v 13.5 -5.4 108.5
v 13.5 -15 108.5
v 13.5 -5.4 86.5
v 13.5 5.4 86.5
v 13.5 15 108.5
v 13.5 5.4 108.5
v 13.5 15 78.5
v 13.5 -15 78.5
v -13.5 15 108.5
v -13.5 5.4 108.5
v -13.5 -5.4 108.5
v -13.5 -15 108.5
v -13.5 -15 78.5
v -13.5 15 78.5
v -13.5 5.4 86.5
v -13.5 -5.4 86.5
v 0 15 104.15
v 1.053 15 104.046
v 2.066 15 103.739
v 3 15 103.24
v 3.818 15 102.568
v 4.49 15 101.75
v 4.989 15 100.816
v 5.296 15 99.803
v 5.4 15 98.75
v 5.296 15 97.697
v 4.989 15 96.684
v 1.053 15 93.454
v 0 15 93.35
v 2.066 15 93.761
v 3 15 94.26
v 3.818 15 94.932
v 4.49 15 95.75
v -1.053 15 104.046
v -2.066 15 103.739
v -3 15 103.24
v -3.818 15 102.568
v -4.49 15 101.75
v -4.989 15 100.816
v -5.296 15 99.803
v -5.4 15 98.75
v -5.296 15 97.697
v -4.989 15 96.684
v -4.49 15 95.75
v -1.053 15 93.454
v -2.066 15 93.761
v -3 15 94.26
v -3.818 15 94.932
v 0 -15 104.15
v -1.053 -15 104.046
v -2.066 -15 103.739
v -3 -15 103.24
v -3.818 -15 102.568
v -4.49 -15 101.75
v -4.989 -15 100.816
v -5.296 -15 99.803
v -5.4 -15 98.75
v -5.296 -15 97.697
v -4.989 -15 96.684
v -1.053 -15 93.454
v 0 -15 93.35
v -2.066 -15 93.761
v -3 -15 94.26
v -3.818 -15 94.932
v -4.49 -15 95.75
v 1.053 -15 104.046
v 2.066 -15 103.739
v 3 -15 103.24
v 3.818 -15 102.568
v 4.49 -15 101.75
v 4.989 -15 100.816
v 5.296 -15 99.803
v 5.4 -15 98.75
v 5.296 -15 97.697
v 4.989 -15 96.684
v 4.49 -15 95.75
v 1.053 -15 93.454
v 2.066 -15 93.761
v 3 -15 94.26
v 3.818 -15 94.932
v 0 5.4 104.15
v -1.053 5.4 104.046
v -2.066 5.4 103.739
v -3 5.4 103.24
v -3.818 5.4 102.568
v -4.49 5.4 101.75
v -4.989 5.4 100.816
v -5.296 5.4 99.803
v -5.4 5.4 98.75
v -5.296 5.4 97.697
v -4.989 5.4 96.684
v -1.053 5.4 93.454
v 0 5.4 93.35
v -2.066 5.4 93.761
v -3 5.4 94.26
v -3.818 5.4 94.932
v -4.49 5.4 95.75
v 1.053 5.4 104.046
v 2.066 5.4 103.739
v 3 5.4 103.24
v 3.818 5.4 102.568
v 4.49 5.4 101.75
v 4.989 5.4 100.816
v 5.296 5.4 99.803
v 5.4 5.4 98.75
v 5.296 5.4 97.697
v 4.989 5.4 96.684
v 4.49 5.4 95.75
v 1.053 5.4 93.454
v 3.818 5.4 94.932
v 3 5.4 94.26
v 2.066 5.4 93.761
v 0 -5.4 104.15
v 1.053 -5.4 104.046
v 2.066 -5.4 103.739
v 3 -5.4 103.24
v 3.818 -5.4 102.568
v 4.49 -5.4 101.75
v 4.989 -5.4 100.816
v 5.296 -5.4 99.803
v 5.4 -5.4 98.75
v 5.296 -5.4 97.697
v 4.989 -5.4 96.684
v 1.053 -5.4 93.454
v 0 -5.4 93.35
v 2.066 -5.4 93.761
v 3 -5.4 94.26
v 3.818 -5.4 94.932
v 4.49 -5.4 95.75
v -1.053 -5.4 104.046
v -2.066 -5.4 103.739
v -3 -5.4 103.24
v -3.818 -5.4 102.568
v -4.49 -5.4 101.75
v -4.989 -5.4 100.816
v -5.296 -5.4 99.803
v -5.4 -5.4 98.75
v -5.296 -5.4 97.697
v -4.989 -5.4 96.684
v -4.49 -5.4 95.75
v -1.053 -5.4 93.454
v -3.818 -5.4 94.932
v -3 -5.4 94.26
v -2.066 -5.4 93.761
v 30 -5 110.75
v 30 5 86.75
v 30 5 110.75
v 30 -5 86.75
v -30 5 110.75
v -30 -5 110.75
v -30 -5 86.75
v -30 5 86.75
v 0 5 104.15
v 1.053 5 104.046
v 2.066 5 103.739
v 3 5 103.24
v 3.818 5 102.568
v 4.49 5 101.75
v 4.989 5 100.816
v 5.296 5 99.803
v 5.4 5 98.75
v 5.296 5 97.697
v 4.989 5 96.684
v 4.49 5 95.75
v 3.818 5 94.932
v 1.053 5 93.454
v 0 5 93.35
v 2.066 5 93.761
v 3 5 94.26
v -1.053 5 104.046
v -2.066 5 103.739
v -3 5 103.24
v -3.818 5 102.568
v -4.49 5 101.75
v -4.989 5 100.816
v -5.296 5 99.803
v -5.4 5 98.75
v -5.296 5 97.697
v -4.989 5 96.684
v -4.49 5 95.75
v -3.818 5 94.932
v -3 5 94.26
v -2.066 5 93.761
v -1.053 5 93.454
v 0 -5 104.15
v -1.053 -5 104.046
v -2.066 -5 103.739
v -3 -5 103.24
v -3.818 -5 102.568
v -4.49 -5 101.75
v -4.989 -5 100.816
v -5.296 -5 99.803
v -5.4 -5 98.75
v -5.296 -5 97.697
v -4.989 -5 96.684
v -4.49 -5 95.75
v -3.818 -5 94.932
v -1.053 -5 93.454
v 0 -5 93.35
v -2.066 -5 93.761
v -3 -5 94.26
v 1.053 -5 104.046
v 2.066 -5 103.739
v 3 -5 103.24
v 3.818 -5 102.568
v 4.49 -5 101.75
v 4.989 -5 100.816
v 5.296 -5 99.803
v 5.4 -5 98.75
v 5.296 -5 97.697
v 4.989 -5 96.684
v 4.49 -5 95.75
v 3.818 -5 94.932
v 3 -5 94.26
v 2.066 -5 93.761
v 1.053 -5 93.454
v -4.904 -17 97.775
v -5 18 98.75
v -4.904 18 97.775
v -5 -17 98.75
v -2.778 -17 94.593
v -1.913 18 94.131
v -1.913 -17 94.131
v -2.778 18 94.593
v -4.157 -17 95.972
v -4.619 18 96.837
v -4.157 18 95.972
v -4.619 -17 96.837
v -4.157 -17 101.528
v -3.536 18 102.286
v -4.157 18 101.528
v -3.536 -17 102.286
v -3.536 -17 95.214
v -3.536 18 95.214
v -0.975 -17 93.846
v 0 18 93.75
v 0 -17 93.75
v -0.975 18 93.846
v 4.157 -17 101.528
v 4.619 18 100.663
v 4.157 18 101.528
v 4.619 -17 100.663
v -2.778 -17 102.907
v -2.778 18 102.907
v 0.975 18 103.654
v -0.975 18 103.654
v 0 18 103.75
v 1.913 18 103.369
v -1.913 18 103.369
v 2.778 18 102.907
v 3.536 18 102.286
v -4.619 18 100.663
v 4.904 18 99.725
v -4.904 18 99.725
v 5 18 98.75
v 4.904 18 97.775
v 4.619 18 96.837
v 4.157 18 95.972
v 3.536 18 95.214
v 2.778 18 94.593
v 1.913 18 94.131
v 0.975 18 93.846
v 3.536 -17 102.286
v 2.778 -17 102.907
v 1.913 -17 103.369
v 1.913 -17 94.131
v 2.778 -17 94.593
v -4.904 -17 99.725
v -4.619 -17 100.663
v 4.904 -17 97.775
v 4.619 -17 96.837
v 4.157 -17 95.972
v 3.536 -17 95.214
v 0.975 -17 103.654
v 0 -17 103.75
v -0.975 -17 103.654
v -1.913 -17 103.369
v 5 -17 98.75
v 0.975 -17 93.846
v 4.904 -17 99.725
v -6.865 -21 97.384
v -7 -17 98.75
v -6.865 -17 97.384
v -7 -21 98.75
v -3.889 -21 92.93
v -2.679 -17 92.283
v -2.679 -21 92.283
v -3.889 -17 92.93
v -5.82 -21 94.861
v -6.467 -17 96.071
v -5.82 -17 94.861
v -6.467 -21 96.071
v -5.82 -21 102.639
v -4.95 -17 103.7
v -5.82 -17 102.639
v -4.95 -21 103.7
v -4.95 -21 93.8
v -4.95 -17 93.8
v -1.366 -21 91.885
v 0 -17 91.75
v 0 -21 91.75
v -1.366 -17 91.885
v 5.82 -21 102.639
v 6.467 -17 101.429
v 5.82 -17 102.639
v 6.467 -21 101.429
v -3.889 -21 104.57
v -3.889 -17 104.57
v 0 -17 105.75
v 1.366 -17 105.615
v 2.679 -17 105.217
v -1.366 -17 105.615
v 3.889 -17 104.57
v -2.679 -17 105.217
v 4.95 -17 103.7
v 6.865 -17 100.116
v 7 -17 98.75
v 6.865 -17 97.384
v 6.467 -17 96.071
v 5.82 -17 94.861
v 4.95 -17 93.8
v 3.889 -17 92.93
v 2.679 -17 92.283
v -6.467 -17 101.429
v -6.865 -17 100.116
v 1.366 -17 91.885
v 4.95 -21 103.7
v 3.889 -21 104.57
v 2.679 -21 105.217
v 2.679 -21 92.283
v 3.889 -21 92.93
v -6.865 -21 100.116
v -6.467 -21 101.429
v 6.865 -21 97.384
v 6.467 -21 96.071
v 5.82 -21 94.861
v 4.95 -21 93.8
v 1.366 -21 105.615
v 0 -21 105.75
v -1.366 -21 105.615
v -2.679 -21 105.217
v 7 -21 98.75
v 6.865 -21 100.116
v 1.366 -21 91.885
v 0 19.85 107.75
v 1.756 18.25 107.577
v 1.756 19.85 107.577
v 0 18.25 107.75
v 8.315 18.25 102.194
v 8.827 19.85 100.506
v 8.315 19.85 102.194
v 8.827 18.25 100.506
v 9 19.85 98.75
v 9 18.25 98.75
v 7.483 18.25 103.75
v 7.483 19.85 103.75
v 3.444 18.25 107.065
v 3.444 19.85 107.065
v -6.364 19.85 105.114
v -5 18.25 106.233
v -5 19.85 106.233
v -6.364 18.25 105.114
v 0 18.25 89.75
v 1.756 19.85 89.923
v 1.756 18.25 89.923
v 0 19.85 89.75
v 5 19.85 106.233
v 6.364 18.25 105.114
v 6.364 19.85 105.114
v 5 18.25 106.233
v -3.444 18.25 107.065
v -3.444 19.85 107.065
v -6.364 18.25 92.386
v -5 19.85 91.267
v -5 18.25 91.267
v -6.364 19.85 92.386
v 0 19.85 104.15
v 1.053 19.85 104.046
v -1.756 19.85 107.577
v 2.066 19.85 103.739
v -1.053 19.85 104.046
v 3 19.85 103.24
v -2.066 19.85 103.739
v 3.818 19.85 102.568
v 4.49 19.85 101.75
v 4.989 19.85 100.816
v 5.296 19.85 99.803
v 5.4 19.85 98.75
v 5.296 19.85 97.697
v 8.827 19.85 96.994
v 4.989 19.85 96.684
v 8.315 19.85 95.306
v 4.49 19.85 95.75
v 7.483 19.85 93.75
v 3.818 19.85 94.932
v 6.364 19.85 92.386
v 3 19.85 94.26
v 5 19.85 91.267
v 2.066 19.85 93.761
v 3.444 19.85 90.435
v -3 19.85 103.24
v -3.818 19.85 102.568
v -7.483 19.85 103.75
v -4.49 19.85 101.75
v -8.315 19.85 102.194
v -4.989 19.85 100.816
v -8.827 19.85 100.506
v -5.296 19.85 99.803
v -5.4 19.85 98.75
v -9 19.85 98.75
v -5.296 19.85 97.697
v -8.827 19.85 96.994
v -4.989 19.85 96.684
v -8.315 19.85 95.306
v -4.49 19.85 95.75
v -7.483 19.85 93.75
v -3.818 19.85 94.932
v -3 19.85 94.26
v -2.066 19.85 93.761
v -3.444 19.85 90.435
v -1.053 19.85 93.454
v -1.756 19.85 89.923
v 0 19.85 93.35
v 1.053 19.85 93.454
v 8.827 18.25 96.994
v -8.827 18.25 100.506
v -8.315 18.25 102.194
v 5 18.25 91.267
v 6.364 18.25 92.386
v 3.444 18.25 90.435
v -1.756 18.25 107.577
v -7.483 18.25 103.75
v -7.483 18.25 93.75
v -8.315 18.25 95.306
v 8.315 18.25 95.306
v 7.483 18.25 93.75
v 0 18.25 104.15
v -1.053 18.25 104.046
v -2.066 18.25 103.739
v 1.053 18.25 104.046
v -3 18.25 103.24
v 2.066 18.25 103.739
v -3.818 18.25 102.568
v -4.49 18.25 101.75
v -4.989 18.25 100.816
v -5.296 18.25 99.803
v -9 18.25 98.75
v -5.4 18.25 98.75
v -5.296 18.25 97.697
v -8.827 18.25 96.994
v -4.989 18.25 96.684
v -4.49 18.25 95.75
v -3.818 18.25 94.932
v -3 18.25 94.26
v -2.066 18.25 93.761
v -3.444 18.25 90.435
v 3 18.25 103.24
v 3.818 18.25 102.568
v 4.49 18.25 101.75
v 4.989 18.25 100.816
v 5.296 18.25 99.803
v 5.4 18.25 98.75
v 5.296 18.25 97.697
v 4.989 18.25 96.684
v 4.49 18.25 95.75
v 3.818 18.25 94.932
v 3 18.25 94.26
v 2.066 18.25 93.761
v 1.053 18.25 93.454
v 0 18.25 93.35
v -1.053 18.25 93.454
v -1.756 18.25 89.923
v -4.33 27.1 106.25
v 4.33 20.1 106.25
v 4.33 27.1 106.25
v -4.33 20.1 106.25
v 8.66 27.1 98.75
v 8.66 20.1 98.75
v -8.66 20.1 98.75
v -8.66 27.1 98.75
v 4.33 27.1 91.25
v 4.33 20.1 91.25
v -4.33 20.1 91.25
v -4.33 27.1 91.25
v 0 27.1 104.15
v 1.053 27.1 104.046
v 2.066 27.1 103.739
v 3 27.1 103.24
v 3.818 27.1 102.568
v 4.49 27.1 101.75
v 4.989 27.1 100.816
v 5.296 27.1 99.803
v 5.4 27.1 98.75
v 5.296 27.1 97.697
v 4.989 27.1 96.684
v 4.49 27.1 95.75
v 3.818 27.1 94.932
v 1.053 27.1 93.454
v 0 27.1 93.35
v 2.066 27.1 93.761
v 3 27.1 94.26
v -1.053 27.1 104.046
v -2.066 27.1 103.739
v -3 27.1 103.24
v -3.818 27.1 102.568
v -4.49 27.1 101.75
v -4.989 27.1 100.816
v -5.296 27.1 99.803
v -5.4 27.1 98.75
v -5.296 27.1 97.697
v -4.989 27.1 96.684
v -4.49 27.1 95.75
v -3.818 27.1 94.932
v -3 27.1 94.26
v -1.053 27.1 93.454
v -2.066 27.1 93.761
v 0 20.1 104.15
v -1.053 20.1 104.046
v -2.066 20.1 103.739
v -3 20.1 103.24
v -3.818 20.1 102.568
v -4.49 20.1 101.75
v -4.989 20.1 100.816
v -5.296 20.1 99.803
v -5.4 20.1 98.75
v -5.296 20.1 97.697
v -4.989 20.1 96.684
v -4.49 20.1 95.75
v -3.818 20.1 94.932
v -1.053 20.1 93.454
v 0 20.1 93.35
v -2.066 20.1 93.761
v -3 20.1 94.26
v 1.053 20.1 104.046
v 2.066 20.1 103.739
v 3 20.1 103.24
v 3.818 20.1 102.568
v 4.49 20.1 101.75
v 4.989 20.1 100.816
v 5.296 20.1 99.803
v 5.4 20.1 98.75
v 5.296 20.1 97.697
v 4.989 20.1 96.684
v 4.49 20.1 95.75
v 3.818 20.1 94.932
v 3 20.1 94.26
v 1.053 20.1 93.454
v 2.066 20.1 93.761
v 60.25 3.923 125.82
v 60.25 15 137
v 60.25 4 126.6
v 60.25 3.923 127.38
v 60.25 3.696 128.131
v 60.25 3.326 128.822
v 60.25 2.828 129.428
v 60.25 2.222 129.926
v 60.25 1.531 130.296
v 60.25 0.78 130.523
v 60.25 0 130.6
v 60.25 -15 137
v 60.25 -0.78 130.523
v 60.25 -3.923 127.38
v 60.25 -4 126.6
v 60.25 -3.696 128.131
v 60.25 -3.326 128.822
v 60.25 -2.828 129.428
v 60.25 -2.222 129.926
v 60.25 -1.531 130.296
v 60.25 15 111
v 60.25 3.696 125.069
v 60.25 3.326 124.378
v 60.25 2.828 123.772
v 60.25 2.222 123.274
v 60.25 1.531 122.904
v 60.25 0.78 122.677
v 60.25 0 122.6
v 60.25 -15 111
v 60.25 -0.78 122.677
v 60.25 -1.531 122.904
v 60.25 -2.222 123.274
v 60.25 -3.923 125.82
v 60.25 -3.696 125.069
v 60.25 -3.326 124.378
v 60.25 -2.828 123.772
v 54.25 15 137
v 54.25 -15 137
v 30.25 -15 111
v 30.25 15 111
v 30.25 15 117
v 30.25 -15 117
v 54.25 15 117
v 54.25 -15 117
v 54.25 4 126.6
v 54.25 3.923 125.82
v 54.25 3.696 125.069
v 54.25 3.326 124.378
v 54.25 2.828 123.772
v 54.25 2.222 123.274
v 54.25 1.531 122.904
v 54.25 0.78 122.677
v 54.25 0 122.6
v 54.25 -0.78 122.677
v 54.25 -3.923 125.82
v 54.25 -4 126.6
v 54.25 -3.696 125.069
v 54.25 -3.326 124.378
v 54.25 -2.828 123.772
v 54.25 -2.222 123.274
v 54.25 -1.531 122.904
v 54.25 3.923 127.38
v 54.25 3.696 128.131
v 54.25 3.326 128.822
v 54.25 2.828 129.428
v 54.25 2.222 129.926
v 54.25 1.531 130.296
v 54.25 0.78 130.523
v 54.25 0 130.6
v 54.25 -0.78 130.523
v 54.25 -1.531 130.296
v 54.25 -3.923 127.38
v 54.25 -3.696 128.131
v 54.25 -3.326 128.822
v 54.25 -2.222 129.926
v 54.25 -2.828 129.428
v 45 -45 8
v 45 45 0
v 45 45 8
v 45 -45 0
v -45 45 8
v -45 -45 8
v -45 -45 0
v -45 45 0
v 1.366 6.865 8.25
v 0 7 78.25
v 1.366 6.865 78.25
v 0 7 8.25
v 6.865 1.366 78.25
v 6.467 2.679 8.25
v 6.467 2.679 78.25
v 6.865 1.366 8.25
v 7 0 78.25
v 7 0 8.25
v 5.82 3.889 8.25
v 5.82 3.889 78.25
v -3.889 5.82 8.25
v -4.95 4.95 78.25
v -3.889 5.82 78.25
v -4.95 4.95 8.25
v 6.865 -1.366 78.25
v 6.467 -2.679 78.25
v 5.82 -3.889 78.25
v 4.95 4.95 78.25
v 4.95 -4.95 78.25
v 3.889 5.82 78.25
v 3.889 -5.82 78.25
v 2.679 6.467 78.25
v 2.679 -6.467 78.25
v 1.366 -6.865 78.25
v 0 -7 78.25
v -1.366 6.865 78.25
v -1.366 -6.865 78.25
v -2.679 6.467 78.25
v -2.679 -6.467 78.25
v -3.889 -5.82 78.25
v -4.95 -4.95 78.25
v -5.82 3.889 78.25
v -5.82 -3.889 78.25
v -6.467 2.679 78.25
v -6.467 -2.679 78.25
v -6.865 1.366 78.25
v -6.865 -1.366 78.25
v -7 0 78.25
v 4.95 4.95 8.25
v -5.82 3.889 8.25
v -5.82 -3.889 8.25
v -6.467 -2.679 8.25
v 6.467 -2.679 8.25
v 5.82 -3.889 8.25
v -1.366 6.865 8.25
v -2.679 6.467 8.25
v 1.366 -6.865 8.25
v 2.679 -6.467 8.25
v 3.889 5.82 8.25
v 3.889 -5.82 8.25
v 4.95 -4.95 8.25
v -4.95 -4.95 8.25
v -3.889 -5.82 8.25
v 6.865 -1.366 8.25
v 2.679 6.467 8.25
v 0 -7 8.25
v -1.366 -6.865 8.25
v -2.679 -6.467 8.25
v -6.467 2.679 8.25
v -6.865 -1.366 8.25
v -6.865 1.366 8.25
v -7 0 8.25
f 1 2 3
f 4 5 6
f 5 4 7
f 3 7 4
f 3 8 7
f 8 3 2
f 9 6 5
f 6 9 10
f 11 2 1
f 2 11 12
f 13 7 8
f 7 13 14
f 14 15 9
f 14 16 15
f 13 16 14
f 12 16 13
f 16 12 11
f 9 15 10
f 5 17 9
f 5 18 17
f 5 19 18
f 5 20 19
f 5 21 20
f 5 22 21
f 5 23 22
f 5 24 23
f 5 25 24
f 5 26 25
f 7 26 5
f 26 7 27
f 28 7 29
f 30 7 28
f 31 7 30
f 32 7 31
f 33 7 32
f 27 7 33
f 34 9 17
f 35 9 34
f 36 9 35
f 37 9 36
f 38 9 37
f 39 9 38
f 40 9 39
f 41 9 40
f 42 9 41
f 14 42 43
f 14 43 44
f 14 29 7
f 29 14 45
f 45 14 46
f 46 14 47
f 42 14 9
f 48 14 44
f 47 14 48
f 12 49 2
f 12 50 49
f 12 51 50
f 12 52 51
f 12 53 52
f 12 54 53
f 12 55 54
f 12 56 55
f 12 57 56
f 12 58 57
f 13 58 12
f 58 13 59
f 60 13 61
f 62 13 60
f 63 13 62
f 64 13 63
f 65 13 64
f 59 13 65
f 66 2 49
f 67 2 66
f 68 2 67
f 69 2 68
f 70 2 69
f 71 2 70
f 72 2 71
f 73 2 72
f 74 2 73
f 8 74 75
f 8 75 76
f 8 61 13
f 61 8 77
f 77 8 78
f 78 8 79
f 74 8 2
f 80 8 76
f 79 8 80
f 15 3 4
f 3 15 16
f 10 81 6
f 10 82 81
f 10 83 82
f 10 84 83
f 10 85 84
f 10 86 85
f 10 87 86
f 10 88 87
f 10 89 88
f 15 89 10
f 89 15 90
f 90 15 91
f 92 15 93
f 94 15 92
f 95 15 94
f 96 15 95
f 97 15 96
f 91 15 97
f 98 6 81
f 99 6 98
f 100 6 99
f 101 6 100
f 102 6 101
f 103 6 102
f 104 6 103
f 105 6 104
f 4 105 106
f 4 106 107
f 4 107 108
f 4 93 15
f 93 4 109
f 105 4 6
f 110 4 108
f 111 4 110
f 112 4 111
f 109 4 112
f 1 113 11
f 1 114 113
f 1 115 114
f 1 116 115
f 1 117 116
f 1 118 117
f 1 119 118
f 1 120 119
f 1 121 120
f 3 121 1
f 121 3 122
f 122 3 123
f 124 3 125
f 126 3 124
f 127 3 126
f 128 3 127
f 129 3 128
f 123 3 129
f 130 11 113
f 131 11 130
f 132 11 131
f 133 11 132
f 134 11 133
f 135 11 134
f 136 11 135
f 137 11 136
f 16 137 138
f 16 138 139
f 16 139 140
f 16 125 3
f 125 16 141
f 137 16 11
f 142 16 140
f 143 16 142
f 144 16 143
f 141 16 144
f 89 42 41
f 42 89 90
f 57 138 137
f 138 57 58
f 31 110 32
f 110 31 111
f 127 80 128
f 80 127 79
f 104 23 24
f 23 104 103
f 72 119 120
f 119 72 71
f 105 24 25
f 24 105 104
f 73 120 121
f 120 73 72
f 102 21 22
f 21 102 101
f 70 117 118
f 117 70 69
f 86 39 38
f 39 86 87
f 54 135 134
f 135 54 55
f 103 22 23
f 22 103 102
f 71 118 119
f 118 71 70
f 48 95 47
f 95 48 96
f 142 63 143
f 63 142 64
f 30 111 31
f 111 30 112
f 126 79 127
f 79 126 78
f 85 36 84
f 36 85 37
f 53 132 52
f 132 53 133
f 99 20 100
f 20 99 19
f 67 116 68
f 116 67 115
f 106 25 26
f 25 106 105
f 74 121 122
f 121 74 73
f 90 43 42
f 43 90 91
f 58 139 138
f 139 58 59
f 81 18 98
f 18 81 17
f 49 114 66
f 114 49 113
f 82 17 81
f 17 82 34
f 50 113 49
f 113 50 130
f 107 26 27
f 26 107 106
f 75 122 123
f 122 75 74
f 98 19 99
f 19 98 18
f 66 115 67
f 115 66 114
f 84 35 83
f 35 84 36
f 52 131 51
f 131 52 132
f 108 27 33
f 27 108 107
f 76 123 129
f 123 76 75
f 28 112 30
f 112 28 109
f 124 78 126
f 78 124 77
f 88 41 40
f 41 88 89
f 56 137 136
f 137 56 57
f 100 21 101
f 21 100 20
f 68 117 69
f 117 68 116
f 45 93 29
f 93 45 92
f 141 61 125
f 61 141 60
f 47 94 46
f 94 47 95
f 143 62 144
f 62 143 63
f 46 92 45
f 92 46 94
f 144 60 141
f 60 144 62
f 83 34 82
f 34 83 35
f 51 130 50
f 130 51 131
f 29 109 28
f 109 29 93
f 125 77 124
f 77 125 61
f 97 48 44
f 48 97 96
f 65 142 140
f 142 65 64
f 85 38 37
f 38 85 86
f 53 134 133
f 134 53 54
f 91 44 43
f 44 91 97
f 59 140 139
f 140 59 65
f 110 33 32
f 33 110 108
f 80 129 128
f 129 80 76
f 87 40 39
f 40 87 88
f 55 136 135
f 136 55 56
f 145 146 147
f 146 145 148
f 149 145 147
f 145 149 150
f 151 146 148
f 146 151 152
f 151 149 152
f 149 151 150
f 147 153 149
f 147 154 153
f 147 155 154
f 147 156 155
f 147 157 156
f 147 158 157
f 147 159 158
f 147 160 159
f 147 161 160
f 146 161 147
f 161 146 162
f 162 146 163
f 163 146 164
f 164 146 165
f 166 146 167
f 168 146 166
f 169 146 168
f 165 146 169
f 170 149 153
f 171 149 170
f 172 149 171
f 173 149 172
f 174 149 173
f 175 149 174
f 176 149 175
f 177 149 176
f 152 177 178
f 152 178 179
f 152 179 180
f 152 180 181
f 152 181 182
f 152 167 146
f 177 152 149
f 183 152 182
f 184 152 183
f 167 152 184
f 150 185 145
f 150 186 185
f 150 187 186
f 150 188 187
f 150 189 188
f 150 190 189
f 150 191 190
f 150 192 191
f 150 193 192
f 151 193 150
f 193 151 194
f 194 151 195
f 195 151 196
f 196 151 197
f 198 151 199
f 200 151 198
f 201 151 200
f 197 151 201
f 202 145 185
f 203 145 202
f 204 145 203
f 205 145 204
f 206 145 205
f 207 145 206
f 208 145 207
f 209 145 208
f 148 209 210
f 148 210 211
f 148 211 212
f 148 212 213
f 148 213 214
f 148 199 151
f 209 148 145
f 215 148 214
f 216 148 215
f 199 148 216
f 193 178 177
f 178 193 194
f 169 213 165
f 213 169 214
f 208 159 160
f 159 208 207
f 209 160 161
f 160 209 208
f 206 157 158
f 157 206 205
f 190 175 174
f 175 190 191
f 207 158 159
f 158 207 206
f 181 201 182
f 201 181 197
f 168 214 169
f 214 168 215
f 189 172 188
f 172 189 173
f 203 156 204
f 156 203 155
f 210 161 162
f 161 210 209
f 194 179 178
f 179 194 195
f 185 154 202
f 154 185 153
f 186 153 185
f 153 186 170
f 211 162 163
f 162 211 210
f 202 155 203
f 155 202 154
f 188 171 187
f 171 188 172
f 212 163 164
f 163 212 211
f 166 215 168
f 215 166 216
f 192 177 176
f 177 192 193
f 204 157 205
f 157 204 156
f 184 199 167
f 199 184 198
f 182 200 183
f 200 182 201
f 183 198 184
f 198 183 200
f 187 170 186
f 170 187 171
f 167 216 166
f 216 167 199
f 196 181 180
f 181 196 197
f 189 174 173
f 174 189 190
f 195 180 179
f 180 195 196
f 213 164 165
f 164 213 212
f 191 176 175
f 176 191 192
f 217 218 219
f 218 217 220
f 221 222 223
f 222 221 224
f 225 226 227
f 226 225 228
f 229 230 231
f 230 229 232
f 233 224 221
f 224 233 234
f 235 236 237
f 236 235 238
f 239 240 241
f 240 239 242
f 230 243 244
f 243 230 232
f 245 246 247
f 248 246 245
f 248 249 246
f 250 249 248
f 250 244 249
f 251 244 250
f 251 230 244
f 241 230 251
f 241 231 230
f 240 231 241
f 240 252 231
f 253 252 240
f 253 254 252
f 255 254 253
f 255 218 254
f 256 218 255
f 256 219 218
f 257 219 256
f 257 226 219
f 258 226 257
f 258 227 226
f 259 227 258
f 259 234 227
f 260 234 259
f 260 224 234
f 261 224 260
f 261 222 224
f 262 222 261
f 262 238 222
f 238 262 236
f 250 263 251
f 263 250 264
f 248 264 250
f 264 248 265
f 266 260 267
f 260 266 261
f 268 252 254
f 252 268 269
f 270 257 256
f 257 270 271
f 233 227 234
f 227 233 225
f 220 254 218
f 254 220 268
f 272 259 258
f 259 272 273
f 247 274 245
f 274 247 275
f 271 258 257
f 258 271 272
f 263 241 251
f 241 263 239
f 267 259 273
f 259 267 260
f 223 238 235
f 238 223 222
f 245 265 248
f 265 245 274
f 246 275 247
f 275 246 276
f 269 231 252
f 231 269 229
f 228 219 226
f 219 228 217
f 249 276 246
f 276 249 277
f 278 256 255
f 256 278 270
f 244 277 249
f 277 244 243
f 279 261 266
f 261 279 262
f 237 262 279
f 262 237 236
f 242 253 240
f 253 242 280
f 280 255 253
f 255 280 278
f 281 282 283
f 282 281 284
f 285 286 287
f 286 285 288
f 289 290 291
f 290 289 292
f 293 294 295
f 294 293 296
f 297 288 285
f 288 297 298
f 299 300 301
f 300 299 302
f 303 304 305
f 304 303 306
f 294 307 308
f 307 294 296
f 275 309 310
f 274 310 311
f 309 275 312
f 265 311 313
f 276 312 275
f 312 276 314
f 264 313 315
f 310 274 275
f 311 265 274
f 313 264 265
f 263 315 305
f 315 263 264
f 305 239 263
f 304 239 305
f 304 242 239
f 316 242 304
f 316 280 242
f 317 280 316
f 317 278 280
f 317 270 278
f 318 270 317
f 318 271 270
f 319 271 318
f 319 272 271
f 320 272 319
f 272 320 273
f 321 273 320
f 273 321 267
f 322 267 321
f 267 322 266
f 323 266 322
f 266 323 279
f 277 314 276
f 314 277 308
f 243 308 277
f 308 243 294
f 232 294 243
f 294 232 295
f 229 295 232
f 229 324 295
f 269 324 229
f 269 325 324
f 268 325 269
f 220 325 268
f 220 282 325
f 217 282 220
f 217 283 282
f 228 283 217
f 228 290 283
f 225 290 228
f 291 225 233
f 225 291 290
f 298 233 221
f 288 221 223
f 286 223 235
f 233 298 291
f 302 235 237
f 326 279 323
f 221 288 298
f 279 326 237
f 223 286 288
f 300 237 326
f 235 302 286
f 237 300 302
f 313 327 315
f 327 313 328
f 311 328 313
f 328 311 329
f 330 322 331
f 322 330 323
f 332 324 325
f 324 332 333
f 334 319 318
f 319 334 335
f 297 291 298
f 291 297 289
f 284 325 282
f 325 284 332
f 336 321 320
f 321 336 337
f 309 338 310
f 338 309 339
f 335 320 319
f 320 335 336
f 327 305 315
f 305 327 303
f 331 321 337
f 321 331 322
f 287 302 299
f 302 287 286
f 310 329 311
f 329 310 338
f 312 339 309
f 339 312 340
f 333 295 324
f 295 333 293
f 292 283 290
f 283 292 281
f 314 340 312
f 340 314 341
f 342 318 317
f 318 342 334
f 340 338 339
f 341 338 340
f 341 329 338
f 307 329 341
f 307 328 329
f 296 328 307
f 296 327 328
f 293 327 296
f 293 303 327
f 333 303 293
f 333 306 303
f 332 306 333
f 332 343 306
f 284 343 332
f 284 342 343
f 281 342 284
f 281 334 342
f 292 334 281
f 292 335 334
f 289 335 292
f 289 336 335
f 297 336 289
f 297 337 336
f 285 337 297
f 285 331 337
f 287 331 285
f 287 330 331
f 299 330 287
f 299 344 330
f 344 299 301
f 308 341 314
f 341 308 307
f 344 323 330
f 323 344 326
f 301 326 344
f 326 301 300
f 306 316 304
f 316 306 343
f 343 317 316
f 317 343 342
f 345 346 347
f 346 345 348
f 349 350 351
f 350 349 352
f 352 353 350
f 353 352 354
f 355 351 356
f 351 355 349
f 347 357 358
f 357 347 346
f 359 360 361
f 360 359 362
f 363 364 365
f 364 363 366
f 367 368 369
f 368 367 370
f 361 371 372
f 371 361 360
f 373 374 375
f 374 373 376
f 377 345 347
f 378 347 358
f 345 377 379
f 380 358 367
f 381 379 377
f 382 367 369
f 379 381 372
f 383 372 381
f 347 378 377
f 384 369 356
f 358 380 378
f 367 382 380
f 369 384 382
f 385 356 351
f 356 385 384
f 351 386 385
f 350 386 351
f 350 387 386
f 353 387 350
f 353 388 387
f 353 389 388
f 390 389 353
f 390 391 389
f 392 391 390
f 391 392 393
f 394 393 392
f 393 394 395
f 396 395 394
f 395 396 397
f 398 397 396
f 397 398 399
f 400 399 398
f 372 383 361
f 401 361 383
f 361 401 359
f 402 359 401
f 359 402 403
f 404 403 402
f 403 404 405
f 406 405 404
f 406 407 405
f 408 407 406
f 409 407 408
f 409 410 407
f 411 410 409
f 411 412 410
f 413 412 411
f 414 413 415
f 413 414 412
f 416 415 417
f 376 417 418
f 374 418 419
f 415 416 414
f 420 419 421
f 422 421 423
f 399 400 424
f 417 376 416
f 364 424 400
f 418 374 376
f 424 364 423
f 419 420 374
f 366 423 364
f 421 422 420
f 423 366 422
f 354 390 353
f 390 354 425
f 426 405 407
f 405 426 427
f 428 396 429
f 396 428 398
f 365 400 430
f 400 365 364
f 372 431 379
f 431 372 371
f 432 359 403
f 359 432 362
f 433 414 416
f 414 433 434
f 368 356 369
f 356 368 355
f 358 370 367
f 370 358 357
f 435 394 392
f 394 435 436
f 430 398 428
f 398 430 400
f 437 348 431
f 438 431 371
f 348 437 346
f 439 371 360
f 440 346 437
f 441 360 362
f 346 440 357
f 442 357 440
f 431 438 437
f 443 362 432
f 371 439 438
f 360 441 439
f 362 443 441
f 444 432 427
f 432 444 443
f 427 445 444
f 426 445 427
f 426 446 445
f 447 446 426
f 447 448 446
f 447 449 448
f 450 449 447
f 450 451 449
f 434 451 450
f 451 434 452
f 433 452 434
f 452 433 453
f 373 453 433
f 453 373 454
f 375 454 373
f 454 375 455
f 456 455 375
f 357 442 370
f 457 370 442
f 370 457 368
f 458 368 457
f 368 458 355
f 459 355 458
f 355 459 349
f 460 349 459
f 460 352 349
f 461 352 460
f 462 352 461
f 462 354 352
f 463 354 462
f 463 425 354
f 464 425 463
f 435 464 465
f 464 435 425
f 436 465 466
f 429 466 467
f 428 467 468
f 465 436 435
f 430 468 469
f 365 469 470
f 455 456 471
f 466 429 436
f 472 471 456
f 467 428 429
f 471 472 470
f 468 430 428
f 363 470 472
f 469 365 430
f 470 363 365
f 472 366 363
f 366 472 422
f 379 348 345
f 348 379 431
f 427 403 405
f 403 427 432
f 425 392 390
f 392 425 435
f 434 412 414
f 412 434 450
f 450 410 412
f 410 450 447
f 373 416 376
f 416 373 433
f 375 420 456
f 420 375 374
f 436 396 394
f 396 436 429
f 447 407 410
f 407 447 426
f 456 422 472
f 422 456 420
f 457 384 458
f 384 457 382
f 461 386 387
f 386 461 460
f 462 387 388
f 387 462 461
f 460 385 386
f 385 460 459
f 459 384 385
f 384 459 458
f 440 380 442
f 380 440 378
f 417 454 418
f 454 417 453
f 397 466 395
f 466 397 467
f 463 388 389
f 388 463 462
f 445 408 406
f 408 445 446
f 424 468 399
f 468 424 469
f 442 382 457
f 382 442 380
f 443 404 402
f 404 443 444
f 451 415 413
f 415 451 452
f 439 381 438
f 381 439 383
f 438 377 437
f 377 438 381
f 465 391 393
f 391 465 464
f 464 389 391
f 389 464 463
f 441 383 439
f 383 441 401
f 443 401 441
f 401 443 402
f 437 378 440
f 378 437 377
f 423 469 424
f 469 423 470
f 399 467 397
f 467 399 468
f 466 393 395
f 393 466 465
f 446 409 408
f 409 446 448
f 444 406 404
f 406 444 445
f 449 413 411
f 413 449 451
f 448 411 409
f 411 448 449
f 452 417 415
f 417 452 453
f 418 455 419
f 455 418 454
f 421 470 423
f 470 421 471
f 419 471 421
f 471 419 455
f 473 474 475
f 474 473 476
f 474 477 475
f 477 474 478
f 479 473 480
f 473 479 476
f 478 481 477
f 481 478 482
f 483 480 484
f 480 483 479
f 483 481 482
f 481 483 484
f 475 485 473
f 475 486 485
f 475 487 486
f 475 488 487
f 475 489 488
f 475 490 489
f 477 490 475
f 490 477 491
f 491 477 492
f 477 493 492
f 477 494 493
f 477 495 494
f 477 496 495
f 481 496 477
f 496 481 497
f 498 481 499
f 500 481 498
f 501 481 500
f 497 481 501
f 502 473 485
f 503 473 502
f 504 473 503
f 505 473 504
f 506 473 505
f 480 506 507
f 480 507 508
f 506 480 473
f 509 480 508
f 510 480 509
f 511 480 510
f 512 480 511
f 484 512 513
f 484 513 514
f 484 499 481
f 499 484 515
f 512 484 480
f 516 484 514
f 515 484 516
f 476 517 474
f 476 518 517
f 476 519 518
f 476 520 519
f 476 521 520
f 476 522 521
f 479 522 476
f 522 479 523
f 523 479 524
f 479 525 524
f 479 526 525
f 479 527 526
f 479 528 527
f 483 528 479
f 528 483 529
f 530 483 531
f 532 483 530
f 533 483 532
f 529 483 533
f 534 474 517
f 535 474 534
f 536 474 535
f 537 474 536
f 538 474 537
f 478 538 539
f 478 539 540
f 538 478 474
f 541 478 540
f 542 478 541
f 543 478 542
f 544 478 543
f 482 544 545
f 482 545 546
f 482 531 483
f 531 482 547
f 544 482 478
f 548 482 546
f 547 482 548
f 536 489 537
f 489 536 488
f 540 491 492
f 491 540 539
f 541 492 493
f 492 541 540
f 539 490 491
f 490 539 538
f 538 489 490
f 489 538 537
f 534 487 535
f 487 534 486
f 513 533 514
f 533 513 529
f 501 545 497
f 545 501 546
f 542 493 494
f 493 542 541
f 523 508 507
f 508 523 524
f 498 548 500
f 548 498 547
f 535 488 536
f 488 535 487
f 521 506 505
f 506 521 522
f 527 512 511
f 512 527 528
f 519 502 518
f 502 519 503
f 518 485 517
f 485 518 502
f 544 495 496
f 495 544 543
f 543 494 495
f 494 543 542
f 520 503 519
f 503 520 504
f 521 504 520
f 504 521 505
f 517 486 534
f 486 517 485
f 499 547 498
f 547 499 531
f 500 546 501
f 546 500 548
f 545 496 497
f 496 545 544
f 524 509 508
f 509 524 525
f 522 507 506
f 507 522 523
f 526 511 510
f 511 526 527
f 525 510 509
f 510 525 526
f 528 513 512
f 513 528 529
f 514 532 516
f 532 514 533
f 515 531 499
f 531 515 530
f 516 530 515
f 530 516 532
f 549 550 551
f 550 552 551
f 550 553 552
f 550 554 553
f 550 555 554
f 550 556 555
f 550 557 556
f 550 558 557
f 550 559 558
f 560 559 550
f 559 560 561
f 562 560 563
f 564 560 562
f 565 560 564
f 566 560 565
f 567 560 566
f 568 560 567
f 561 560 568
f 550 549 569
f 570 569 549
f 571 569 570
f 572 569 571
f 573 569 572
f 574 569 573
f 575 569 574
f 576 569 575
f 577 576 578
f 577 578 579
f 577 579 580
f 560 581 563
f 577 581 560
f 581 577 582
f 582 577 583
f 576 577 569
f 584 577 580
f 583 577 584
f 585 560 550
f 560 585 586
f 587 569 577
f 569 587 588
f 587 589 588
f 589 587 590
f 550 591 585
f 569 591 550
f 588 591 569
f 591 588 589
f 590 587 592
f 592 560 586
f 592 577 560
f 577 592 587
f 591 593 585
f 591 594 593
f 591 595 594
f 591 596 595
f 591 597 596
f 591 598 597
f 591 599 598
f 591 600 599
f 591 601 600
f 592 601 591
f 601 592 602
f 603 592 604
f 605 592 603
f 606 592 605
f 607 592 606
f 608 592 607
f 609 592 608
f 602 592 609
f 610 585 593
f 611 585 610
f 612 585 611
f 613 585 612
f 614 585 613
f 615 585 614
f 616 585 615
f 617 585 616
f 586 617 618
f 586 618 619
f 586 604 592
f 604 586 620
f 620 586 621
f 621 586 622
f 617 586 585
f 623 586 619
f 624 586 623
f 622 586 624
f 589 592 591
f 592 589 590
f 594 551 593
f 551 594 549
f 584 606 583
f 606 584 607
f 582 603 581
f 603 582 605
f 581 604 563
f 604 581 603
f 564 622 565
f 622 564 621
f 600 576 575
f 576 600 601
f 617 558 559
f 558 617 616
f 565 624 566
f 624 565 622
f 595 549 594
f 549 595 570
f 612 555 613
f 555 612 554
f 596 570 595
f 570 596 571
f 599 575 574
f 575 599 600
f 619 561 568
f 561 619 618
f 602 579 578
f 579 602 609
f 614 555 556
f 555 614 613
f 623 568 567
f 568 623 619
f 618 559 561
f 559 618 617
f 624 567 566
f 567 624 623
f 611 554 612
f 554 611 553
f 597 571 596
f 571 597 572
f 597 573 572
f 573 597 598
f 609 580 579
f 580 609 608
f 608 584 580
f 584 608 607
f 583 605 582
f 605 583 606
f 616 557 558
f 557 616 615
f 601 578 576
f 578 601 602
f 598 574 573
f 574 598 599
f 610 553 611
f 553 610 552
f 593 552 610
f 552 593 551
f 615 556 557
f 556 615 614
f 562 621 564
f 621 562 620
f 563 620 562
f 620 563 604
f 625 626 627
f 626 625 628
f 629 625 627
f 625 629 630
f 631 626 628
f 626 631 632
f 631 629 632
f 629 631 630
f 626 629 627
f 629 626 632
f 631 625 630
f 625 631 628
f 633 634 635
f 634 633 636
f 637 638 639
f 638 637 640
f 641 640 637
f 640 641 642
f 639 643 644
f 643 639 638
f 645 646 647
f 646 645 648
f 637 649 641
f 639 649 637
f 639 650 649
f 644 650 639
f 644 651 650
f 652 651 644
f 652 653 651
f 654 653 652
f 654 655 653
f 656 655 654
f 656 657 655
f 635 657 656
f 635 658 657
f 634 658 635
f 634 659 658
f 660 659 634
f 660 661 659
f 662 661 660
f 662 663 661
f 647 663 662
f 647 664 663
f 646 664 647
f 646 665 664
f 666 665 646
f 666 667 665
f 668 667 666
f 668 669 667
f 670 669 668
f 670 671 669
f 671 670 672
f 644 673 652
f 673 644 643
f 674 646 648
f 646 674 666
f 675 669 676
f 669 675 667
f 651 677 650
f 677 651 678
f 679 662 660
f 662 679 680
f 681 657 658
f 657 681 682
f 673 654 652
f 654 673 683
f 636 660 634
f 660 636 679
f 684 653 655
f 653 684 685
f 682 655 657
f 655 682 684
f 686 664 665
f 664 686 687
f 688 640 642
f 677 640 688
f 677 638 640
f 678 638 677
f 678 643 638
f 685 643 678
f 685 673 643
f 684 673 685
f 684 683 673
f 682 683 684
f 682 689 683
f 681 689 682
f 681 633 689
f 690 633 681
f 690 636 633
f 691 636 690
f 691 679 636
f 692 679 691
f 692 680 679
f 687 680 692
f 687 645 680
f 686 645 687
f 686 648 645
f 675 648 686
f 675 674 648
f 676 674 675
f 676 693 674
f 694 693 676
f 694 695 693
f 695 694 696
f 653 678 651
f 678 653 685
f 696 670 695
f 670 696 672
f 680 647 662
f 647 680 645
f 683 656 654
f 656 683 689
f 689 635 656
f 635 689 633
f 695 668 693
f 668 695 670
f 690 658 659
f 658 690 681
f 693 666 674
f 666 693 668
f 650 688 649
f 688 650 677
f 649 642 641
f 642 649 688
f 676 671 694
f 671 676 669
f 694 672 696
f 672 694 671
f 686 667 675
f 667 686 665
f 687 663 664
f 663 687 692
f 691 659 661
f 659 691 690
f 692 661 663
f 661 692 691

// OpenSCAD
$fn = 32;

// ------------------------------------------------------------------------
// Lamp arm: column d14 x 70 mm, arm 60 mm
// Every part is its own module, assembly() places every instance.
// ------------------------------------------------------------------------

// --- part 1 ---
module lamp_base() {
  difference() {
    translate([-45, -45, 0]) cube([90, 90, 8]);
  }
}

// --- part 2 ---
module lamp_column() {
  cylinder(h = 70, d = 14);
}

// --- part 3 ---
module head_fork() {
  difference() {
    translate([-13.5, -15, 0]) cube([27, 30, 30]);
    translate([-14.5, -5.4, 8]) cube([29, 10.8, 23]);
    translate([0, 0, 20.25]) rotate([90, 0, 0]) cylinder(h = 32, d = 10.8, center = true);
  }
}

// --- part 4 ---
module lamp_arm() {
  difference() {
    translate([-30, -5, 0]) cube([60, 10, 24]);
    translate([0, 0, 12]) rotate([90, 0, 0]) cylinder(h = 12, d = 10.8, center = true);
  }
}

// --- part 5 ---
module arm_pin() {
  rotate([0, 90, 0]) cylinder(h = 36, d = 10, center = true);
  translate([-21, 0, 0]) rotate([0, 90, 0]) cylinder(h = 4, d = 14);
}

// --- part 6 ---
module arm_washer() {
  difference() {
      translate([0, 0, 0]) cylinder(h = 1.6, d = 18);
      translate([0, 0, -1]) cylinder(h = 3.6, d = 10.8);
    }
}

// --- part 7 ---
module arm_nut() {
  difference() {
    linear_extrude(height = 7) polygon(points = [[8.66, 0], [4.33, 7.5], [-4.33, 7.5], [-8.66, 0], [-4.33, -7.5], [4.33, -7.5]]);
    translate([0, 0, -1]) cylinder(h = 9, d = 10.8);
  }
}

// --- part 8 ---
module shade_bracket() {
  difference() {
    translate([-15, -15, 0]) cube([30, 30, 26]);
    translate([-16, -16, 6]) cube([25, 32, 21]);
    translate([12, 0, 15.6]) rotate([0, 90, 0]) cylinder(h = 8, d = 8, center = true);
  }
}

// --- assembly ---
module assembly() {
  color([0.80, 0.24, 0.20]) translate([0, 0, 0]) rotate([0, 0, 0]) lamp_base();
  color([0.20, 0.45, 0.75]) translate([0, 0, 8.25]) rotate([0, 0, 0]) lamp_column();
  color([0.25, 0.62, 0.32]) translate([0, 0, 78.5]) rotate([0, 0, 0]) head_fork();
  color([0.92, 0.70, 0.18]) translate([0, 0, 86.75]) rotate([0, 0, 0]) lamp_arm();
  color([0.58, 0.35, 0.70]) translate([0, 0, 98.75]) rotate([0, 0, 90]) arm_pin();
  color([0.16, 0.66, 0.66]) translate([0, 19.85, 98.75]) rotate([90, 0, 0]) arm_washer();
  color([0.85, 0.48, 0.18]) translate([0, 27.1, 98.75]) rotate([90, 0, 0]) arm_nut();
  color([0.55, 0.60, 0.65]) translate([45.25, 0, 111]) rotate([0, 0, 0]) shade_bracket();
}

assembly();
